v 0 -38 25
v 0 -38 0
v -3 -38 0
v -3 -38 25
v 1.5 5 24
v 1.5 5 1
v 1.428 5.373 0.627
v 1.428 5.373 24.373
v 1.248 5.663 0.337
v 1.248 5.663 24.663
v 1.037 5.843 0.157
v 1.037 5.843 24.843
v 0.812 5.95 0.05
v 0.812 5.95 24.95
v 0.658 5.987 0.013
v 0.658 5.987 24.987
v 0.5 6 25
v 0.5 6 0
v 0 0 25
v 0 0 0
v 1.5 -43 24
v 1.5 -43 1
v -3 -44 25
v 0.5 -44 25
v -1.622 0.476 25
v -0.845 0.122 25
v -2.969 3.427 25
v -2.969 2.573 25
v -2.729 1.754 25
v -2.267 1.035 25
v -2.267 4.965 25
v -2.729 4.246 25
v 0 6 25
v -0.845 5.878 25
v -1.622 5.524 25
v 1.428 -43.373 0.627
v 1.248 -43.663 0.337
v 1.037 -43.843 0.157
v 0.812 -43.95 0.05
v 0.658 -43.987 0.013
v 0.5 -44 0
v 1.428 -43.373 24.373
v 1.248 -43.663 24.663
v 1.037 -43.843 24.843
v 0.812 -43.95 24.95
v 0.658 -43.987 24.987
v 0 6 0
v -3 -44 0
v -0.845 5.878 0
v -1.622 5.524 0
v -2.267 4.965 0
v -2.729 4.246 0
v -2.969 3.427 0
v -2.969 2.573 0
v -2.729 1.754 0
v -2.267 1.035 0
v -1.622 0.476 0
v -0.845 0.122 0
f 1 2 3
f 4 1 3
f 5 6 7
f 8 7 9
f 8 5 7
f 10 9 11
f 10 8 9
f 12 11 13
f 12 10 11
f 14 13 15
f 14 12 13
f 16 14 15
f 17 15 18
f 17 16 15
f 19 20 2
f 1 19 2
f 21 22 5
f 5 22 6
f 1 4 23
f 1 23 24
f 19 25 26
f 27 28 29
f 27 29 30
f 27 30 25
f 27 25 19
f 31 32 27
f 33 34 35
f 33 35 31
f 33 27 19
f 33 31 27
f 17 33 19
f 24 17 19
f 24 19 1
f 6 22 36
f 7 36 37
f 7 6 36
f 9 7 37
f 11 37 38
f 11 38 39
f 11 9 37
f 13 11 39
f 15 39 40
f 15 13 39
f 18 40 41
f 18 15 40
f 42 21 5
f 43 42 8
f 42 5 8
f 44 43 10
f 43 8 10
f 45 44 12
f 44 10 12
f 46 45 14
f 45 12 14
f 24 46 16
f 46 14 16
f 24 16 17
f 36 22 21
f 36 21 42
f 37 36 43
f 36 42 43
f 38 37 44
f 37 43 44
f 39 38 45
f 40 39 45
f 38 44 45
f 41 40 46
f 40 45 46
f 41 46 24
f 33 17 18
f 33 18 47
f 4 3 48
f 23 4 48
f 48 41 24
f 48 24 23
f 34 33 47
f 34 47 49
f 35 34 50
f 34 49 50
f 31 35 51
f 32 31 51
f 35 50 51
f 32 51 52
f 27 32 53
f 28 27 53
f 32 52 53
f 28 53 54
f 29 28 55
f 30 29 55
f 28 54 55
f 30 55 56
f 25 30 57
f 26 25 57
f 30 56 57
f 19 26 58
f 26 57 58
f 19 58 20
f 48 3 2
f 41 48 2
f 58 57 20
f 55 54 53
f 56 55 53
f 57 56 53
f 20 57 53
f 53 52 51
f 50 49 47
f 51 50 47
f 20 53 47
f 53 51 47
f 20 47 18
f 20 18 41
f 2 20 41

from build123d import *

# Parameters (mm, degrees)
PAD_DEPTH = 25
FILLET_R  = 1


with BuildPart() as part:
    # Sketch → Pad (new body)
    with BuildSketch(Plane.XY):
        with BuildLine():
            Line((1.5, -44), (1.5, 6))
            Line((1.5, 6), (0, 6))
            ThreePointArc((0, 6), (-3, 3), (0, 0))
            Line((0, 0), (0, -38))
            Line((0, -38), (-3, -38))
            Line((-3, -38), (-3, -44))
            Line((1.5, -44), (-3, -44))
        make_face()
    extrude(amount=PAD_DEPTH)

    # Fillet
    fillet_edges = [part.edges().sort_by_distance(p)[0] for p in [
        (1.5, -44, 12.5),
        (1.5, 6, 12.5),
        (1.5, -19, 0),
        (1.5, -19, 25),
    ]]
    fillet(fillet_edges, radius=FILLET_R)


solid = part.part
